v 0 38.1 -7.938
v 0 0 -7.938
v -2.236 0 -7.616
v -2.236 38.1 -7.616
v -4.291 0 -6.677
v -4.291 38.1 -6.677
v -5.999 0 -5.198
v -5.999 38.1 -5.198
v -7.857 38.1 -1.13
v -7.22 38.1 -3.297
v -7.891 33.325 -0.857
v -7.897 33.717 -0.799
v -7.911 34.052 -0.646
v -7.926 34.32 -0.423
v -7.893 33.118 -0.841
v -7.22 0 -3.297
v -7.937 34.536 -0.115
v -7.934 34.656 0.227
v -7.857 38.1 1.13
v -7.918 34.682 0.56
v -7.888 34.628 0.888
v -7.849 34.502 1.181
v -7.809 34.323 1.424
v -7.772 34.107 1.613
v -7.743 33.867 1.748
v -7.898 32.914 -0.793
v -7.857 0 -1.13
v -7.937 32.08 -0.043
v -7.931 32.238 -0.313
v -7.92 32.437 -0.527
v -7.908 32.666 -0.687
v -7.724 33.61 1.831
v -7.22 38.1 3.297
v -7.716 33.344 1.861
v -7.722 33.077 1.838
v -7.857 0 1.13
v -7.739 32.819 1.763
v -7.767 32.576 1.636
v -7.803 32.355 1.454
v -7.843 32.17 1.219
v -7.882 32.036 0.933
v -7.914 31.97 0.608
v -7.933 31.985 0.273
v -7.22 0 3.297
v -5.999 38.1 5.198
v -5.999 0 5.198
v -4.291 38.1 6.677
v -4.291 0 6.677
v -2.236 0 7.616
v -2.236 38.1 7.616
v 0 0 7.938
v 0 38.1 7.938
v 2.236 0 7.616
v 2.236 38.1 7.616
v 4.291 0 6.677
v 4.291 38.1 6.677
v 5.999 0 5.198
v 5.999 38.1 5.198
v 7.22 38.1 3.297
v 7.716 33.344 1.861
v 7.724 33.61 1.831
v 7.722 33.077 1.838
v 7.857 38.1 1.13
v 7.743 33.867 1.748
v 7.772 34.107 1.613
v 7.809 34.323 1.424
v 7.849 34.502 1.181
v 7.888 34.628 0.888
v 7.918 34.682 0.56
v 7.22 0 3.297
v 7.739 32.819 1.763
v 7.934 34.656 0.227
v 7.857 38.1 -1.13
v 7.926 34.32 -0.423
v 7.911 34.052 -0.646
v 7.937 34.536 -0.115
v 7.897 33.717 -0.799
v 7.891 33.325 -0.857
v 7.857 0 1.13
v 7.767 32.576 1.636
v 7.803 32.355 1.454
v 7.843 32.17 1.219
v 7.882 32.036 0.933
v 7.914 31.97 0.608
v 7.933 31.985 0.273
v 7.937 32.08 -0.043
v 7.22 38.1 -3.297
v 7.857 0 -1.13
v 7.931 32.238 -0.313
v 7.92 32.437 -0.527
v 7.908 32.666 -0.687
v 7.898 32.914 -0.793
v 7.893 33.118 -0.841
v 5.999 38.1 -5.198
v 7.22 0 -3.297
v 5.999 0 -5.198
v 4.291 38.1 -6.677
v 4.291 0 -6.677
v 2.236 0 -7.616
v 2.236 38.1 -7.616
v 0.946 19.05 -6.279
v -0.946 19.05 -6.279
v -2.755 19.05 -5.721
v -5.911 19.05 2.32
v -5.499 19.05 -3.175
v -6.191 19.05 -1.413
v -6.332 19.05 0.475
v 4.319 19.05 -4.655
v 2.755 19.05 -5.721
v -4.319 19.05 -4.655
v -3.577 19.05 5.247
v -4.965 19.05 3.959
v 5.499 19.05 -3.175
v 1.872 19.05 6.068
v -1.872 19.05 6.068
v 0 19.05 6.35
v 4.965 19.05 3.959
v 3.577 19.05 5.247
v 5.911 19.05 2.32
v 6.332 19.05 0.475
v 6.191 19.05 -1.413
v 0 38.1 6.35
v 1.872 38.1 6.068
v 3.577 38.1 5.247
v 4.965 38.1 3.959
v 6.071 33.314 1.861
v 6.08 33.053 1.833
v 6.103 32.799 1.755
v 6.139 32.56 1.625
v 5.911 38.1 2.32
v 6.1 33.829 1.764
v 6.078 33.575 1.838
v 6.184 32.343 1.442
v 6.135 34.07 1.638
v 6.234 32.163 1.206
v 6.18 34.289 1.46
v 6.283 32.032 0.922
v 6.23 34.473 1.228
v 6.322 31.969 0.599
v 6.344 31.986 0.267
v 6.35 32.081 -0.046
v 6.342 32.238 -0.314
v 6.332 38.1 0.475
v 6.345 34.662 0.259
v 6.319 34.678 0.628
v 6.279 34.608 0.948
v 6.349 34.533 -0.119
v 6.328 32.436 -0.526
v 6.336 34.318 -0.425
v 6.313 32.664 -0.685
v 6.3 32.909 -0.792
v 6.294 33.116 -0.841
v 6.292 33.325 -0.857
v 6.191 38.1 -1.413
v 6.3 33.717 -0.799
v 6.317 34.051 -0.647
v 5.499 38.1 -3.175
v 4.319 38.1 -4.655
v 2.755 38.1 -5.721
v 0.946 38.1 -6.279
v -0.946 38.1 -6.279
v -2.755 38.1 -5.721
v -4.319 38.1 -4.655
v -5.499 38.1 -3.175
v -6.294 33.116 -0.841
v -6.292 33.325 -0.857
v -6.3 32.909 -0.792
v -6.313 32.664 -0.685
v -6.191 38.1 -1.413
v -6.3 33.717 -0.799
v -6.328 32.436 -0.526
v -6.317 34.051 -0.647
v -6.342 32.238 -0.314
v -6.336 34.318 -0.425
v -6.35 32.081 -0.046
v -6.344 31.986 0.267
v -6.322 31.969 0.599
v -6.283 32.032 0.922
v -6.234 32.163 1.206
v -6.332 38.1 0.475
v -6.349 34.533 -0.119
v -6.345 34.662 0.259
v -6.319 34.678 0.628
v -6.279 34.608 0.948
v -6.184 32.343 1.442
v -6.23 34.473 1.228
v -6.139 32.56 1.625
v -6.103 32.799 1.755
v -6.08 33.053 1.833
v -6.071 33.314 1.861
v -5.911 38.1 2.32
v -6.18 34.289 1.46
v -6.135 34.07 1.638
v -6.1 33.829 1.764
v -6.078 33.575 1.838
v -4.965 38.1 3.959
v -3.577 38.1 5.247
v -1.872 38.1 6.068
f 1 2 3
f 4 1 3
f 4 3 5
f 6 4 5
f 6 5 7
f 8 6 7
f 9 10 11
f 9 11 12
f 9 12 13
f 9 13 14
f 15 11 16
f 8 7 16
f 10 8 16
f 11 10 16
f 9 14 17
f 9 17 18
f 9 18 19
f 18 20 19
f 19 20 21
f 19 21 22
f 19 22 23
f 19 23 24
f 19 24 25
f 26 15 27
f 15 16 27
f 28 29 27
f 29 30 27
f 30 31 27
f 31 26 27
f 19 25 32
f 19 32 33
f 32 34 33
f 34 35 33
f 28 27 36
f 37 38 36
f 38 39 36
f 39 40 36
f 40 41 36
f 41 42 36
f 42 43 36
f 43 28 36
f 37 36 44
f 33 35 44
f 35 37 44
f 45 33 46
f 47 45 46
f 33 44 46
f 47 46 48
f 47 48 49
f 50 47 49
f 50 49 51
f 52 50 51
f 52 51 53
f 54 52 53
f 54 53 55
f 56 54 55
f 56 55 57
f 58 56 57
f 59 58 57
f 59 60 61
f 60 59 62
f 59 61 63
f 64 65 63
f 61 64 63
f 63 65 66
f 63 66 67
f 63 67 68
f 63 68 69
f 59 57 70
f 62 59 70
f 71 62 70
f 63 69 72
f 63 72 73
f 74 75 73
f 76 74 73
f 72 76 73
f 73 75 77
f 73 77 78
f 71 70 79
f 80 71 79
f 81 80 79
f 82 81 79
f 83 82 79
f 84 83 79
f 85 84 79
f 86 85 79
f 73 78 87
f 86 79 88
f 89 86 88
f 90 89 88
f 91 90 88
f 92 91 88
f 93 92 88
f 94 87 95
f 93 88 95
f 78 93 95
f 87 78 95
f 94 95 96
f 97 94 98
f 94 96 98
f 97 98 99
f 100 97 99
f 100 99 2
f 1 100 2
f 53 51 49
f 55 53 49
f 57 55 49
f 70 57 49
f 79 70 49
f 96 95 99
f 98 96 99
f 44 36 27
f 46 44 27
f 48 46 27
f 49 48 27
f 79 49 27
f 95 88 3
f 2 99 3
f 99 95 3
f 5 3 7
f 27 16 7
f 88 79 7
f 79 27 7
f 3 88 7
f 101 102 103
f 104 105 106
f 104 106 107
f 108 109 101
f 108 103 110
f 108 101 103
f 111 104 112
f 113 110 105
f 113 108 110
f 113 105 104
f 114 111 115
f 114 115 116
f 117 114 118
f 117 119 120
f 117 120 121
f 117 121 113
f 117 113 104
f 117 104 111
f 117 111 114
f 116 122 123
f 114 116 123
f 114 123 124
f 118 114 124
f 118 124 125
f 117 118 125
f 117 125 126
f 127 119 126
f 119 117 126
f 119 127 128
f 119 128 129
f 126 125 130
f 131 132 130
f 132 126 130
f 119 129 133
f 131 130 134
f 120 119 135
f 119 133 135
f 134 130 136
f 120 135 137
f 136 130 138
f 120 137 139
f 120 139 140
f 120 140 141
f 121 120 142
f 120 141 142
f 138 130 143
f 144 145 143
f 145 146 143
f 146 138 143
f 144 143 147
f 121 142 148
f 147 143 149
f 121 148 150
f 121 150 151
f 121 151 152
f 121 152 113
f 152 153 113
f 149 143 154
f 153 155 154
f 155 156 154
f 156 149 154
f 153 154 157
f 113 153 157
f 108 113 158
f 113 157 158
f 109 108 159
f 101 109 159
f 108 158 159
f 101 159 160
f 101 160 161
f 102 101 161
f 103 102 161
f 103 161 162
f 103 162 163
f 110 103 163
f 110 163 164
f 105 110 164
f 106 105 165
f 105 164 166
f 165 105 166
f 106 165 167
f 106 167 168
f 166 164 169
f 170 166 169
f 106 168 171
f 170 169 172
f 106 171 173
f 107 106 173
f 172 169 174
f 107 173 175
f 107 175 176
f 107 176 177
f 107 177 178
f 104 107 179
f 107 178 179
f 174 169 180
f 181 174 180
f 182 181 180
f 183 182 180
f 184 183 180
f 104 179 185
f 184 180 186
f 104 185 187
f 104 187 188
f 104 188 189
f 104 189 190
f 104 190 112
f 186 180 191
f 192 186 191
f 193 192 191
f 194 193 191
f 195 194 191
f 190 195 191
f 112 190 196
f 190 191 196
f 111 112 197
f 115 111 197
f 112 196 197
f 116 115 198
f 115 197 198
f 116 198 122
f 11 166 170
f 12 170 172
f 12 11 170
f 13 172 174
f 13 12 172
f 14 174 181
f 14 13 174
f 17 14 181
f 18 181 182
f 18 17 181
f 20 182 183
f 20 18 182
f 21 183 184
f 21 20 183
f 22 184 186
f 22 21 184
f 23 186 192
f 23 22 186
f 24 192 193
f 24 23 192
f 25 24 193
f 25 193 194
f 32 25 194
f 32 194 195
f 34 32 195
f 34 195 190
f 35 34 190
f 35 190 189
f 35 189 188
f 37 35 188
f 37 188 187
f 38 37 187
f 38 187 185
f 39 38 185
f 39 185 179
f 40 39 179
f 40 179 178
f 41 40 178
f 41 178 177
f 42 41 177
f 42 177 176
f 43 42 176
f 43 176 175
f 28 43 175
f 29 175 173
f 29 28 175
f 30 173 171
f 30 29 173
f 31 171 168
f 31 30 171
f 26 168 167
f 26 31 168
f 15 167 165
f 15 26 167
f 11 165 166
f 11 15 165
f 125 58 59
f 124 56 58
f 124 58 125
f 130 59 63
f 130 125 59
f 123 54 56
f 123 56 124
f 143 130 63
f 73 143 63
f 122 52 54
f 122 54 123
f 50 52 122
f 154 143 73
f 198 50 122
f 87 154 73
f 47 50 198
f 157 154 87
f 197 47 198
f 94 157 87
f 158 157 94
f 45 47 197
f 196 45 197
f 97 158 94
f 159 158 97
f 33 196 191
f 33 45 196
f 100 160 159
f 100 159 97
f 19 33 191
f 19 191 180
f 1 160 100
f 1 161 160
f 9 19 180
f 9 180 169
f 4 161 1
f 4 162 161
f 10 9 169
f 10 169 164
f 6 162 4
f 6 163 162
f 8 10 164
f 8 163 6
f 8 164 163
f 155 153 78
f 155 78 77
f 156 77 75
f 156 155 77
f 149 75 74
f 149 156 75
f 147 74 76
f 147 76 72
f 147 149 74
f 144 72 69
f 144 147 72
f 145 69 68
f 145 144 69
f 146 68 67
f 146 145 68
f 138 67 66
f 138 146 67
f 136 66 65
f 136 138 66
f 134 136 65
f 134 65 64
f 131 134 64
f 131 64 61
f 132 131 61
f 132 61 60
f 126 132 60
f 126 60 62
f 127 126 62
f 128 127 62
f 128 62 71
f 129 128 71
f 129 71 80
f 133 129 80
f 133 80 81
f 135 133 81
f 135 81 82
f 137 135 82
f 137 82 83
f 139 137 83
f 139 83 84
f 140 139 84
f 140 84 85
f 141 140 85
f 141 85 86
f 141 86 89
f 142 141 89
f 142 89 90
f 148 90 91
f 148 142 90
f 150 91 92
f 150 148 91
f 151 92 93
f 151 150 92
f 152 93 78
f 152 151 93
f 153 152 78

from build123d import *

# Parameters (mm, degrees)
SKETCH2_R            = 7.9375
PISTONE_BASE_DEPTH   = 38.1
SKETCH3_R            = 6.35
DRILL_HOLE_1_DEPTH   = 19.05
TOP_WHOLE_DEPTH      = 40.71923731
TOP_WHOLE_DEPTH_BACK = 40.71923731
SKETCH6_R            = 1.3589


with BuildPart() as part:
    # Sketch2 → Pistone Base (new body)
    with BuildSketch(Plane(origin=(0, 0, 0), x_dir=(1, 0, 0), z_dir=(0, 1, 0))):
        with Locations(Location((0, 0, 0), (0, 0, 90))):
            Circle(SKETCH2_R)
    extrude(amount=PISTONE_BASE_DEPTH)

    # Sketch3 → Drill Hole 1 (cut)
    with BuildSketch(Plane(origin=(0, 38.1, 0), x_dir=(1, 0, 0), z_dir=(0, 1, 0))):
        with Locations(Location((0, 0, 0), (0, 0, 270))):
            Circle(SKETCH3_R)
    extrude(amount=-DRILL_HOLE_1_DEPTH, mode=Mode.SUBTRACT)

    # Sketch6 → Top Whole (cut, two sides: drawn at the far end of the back side and taken through both)
    with BuildSketch(Plane(origin=(0, 0, 0), x_dir=(0, 0, -1), z_dir=(1, 0, 0)).offset(-TOP_WHOLE_DEPTH_BACK)):
        with Locations((-0.502050886, 33.3248)):
            Circle(SKETCH6_R)
    extrude(amount=TOP_WHOLE_DEPTH + TOP_WHOLE_DEPTH_BACK, mode=Mode.SUBTRACT)


solid = part.part
